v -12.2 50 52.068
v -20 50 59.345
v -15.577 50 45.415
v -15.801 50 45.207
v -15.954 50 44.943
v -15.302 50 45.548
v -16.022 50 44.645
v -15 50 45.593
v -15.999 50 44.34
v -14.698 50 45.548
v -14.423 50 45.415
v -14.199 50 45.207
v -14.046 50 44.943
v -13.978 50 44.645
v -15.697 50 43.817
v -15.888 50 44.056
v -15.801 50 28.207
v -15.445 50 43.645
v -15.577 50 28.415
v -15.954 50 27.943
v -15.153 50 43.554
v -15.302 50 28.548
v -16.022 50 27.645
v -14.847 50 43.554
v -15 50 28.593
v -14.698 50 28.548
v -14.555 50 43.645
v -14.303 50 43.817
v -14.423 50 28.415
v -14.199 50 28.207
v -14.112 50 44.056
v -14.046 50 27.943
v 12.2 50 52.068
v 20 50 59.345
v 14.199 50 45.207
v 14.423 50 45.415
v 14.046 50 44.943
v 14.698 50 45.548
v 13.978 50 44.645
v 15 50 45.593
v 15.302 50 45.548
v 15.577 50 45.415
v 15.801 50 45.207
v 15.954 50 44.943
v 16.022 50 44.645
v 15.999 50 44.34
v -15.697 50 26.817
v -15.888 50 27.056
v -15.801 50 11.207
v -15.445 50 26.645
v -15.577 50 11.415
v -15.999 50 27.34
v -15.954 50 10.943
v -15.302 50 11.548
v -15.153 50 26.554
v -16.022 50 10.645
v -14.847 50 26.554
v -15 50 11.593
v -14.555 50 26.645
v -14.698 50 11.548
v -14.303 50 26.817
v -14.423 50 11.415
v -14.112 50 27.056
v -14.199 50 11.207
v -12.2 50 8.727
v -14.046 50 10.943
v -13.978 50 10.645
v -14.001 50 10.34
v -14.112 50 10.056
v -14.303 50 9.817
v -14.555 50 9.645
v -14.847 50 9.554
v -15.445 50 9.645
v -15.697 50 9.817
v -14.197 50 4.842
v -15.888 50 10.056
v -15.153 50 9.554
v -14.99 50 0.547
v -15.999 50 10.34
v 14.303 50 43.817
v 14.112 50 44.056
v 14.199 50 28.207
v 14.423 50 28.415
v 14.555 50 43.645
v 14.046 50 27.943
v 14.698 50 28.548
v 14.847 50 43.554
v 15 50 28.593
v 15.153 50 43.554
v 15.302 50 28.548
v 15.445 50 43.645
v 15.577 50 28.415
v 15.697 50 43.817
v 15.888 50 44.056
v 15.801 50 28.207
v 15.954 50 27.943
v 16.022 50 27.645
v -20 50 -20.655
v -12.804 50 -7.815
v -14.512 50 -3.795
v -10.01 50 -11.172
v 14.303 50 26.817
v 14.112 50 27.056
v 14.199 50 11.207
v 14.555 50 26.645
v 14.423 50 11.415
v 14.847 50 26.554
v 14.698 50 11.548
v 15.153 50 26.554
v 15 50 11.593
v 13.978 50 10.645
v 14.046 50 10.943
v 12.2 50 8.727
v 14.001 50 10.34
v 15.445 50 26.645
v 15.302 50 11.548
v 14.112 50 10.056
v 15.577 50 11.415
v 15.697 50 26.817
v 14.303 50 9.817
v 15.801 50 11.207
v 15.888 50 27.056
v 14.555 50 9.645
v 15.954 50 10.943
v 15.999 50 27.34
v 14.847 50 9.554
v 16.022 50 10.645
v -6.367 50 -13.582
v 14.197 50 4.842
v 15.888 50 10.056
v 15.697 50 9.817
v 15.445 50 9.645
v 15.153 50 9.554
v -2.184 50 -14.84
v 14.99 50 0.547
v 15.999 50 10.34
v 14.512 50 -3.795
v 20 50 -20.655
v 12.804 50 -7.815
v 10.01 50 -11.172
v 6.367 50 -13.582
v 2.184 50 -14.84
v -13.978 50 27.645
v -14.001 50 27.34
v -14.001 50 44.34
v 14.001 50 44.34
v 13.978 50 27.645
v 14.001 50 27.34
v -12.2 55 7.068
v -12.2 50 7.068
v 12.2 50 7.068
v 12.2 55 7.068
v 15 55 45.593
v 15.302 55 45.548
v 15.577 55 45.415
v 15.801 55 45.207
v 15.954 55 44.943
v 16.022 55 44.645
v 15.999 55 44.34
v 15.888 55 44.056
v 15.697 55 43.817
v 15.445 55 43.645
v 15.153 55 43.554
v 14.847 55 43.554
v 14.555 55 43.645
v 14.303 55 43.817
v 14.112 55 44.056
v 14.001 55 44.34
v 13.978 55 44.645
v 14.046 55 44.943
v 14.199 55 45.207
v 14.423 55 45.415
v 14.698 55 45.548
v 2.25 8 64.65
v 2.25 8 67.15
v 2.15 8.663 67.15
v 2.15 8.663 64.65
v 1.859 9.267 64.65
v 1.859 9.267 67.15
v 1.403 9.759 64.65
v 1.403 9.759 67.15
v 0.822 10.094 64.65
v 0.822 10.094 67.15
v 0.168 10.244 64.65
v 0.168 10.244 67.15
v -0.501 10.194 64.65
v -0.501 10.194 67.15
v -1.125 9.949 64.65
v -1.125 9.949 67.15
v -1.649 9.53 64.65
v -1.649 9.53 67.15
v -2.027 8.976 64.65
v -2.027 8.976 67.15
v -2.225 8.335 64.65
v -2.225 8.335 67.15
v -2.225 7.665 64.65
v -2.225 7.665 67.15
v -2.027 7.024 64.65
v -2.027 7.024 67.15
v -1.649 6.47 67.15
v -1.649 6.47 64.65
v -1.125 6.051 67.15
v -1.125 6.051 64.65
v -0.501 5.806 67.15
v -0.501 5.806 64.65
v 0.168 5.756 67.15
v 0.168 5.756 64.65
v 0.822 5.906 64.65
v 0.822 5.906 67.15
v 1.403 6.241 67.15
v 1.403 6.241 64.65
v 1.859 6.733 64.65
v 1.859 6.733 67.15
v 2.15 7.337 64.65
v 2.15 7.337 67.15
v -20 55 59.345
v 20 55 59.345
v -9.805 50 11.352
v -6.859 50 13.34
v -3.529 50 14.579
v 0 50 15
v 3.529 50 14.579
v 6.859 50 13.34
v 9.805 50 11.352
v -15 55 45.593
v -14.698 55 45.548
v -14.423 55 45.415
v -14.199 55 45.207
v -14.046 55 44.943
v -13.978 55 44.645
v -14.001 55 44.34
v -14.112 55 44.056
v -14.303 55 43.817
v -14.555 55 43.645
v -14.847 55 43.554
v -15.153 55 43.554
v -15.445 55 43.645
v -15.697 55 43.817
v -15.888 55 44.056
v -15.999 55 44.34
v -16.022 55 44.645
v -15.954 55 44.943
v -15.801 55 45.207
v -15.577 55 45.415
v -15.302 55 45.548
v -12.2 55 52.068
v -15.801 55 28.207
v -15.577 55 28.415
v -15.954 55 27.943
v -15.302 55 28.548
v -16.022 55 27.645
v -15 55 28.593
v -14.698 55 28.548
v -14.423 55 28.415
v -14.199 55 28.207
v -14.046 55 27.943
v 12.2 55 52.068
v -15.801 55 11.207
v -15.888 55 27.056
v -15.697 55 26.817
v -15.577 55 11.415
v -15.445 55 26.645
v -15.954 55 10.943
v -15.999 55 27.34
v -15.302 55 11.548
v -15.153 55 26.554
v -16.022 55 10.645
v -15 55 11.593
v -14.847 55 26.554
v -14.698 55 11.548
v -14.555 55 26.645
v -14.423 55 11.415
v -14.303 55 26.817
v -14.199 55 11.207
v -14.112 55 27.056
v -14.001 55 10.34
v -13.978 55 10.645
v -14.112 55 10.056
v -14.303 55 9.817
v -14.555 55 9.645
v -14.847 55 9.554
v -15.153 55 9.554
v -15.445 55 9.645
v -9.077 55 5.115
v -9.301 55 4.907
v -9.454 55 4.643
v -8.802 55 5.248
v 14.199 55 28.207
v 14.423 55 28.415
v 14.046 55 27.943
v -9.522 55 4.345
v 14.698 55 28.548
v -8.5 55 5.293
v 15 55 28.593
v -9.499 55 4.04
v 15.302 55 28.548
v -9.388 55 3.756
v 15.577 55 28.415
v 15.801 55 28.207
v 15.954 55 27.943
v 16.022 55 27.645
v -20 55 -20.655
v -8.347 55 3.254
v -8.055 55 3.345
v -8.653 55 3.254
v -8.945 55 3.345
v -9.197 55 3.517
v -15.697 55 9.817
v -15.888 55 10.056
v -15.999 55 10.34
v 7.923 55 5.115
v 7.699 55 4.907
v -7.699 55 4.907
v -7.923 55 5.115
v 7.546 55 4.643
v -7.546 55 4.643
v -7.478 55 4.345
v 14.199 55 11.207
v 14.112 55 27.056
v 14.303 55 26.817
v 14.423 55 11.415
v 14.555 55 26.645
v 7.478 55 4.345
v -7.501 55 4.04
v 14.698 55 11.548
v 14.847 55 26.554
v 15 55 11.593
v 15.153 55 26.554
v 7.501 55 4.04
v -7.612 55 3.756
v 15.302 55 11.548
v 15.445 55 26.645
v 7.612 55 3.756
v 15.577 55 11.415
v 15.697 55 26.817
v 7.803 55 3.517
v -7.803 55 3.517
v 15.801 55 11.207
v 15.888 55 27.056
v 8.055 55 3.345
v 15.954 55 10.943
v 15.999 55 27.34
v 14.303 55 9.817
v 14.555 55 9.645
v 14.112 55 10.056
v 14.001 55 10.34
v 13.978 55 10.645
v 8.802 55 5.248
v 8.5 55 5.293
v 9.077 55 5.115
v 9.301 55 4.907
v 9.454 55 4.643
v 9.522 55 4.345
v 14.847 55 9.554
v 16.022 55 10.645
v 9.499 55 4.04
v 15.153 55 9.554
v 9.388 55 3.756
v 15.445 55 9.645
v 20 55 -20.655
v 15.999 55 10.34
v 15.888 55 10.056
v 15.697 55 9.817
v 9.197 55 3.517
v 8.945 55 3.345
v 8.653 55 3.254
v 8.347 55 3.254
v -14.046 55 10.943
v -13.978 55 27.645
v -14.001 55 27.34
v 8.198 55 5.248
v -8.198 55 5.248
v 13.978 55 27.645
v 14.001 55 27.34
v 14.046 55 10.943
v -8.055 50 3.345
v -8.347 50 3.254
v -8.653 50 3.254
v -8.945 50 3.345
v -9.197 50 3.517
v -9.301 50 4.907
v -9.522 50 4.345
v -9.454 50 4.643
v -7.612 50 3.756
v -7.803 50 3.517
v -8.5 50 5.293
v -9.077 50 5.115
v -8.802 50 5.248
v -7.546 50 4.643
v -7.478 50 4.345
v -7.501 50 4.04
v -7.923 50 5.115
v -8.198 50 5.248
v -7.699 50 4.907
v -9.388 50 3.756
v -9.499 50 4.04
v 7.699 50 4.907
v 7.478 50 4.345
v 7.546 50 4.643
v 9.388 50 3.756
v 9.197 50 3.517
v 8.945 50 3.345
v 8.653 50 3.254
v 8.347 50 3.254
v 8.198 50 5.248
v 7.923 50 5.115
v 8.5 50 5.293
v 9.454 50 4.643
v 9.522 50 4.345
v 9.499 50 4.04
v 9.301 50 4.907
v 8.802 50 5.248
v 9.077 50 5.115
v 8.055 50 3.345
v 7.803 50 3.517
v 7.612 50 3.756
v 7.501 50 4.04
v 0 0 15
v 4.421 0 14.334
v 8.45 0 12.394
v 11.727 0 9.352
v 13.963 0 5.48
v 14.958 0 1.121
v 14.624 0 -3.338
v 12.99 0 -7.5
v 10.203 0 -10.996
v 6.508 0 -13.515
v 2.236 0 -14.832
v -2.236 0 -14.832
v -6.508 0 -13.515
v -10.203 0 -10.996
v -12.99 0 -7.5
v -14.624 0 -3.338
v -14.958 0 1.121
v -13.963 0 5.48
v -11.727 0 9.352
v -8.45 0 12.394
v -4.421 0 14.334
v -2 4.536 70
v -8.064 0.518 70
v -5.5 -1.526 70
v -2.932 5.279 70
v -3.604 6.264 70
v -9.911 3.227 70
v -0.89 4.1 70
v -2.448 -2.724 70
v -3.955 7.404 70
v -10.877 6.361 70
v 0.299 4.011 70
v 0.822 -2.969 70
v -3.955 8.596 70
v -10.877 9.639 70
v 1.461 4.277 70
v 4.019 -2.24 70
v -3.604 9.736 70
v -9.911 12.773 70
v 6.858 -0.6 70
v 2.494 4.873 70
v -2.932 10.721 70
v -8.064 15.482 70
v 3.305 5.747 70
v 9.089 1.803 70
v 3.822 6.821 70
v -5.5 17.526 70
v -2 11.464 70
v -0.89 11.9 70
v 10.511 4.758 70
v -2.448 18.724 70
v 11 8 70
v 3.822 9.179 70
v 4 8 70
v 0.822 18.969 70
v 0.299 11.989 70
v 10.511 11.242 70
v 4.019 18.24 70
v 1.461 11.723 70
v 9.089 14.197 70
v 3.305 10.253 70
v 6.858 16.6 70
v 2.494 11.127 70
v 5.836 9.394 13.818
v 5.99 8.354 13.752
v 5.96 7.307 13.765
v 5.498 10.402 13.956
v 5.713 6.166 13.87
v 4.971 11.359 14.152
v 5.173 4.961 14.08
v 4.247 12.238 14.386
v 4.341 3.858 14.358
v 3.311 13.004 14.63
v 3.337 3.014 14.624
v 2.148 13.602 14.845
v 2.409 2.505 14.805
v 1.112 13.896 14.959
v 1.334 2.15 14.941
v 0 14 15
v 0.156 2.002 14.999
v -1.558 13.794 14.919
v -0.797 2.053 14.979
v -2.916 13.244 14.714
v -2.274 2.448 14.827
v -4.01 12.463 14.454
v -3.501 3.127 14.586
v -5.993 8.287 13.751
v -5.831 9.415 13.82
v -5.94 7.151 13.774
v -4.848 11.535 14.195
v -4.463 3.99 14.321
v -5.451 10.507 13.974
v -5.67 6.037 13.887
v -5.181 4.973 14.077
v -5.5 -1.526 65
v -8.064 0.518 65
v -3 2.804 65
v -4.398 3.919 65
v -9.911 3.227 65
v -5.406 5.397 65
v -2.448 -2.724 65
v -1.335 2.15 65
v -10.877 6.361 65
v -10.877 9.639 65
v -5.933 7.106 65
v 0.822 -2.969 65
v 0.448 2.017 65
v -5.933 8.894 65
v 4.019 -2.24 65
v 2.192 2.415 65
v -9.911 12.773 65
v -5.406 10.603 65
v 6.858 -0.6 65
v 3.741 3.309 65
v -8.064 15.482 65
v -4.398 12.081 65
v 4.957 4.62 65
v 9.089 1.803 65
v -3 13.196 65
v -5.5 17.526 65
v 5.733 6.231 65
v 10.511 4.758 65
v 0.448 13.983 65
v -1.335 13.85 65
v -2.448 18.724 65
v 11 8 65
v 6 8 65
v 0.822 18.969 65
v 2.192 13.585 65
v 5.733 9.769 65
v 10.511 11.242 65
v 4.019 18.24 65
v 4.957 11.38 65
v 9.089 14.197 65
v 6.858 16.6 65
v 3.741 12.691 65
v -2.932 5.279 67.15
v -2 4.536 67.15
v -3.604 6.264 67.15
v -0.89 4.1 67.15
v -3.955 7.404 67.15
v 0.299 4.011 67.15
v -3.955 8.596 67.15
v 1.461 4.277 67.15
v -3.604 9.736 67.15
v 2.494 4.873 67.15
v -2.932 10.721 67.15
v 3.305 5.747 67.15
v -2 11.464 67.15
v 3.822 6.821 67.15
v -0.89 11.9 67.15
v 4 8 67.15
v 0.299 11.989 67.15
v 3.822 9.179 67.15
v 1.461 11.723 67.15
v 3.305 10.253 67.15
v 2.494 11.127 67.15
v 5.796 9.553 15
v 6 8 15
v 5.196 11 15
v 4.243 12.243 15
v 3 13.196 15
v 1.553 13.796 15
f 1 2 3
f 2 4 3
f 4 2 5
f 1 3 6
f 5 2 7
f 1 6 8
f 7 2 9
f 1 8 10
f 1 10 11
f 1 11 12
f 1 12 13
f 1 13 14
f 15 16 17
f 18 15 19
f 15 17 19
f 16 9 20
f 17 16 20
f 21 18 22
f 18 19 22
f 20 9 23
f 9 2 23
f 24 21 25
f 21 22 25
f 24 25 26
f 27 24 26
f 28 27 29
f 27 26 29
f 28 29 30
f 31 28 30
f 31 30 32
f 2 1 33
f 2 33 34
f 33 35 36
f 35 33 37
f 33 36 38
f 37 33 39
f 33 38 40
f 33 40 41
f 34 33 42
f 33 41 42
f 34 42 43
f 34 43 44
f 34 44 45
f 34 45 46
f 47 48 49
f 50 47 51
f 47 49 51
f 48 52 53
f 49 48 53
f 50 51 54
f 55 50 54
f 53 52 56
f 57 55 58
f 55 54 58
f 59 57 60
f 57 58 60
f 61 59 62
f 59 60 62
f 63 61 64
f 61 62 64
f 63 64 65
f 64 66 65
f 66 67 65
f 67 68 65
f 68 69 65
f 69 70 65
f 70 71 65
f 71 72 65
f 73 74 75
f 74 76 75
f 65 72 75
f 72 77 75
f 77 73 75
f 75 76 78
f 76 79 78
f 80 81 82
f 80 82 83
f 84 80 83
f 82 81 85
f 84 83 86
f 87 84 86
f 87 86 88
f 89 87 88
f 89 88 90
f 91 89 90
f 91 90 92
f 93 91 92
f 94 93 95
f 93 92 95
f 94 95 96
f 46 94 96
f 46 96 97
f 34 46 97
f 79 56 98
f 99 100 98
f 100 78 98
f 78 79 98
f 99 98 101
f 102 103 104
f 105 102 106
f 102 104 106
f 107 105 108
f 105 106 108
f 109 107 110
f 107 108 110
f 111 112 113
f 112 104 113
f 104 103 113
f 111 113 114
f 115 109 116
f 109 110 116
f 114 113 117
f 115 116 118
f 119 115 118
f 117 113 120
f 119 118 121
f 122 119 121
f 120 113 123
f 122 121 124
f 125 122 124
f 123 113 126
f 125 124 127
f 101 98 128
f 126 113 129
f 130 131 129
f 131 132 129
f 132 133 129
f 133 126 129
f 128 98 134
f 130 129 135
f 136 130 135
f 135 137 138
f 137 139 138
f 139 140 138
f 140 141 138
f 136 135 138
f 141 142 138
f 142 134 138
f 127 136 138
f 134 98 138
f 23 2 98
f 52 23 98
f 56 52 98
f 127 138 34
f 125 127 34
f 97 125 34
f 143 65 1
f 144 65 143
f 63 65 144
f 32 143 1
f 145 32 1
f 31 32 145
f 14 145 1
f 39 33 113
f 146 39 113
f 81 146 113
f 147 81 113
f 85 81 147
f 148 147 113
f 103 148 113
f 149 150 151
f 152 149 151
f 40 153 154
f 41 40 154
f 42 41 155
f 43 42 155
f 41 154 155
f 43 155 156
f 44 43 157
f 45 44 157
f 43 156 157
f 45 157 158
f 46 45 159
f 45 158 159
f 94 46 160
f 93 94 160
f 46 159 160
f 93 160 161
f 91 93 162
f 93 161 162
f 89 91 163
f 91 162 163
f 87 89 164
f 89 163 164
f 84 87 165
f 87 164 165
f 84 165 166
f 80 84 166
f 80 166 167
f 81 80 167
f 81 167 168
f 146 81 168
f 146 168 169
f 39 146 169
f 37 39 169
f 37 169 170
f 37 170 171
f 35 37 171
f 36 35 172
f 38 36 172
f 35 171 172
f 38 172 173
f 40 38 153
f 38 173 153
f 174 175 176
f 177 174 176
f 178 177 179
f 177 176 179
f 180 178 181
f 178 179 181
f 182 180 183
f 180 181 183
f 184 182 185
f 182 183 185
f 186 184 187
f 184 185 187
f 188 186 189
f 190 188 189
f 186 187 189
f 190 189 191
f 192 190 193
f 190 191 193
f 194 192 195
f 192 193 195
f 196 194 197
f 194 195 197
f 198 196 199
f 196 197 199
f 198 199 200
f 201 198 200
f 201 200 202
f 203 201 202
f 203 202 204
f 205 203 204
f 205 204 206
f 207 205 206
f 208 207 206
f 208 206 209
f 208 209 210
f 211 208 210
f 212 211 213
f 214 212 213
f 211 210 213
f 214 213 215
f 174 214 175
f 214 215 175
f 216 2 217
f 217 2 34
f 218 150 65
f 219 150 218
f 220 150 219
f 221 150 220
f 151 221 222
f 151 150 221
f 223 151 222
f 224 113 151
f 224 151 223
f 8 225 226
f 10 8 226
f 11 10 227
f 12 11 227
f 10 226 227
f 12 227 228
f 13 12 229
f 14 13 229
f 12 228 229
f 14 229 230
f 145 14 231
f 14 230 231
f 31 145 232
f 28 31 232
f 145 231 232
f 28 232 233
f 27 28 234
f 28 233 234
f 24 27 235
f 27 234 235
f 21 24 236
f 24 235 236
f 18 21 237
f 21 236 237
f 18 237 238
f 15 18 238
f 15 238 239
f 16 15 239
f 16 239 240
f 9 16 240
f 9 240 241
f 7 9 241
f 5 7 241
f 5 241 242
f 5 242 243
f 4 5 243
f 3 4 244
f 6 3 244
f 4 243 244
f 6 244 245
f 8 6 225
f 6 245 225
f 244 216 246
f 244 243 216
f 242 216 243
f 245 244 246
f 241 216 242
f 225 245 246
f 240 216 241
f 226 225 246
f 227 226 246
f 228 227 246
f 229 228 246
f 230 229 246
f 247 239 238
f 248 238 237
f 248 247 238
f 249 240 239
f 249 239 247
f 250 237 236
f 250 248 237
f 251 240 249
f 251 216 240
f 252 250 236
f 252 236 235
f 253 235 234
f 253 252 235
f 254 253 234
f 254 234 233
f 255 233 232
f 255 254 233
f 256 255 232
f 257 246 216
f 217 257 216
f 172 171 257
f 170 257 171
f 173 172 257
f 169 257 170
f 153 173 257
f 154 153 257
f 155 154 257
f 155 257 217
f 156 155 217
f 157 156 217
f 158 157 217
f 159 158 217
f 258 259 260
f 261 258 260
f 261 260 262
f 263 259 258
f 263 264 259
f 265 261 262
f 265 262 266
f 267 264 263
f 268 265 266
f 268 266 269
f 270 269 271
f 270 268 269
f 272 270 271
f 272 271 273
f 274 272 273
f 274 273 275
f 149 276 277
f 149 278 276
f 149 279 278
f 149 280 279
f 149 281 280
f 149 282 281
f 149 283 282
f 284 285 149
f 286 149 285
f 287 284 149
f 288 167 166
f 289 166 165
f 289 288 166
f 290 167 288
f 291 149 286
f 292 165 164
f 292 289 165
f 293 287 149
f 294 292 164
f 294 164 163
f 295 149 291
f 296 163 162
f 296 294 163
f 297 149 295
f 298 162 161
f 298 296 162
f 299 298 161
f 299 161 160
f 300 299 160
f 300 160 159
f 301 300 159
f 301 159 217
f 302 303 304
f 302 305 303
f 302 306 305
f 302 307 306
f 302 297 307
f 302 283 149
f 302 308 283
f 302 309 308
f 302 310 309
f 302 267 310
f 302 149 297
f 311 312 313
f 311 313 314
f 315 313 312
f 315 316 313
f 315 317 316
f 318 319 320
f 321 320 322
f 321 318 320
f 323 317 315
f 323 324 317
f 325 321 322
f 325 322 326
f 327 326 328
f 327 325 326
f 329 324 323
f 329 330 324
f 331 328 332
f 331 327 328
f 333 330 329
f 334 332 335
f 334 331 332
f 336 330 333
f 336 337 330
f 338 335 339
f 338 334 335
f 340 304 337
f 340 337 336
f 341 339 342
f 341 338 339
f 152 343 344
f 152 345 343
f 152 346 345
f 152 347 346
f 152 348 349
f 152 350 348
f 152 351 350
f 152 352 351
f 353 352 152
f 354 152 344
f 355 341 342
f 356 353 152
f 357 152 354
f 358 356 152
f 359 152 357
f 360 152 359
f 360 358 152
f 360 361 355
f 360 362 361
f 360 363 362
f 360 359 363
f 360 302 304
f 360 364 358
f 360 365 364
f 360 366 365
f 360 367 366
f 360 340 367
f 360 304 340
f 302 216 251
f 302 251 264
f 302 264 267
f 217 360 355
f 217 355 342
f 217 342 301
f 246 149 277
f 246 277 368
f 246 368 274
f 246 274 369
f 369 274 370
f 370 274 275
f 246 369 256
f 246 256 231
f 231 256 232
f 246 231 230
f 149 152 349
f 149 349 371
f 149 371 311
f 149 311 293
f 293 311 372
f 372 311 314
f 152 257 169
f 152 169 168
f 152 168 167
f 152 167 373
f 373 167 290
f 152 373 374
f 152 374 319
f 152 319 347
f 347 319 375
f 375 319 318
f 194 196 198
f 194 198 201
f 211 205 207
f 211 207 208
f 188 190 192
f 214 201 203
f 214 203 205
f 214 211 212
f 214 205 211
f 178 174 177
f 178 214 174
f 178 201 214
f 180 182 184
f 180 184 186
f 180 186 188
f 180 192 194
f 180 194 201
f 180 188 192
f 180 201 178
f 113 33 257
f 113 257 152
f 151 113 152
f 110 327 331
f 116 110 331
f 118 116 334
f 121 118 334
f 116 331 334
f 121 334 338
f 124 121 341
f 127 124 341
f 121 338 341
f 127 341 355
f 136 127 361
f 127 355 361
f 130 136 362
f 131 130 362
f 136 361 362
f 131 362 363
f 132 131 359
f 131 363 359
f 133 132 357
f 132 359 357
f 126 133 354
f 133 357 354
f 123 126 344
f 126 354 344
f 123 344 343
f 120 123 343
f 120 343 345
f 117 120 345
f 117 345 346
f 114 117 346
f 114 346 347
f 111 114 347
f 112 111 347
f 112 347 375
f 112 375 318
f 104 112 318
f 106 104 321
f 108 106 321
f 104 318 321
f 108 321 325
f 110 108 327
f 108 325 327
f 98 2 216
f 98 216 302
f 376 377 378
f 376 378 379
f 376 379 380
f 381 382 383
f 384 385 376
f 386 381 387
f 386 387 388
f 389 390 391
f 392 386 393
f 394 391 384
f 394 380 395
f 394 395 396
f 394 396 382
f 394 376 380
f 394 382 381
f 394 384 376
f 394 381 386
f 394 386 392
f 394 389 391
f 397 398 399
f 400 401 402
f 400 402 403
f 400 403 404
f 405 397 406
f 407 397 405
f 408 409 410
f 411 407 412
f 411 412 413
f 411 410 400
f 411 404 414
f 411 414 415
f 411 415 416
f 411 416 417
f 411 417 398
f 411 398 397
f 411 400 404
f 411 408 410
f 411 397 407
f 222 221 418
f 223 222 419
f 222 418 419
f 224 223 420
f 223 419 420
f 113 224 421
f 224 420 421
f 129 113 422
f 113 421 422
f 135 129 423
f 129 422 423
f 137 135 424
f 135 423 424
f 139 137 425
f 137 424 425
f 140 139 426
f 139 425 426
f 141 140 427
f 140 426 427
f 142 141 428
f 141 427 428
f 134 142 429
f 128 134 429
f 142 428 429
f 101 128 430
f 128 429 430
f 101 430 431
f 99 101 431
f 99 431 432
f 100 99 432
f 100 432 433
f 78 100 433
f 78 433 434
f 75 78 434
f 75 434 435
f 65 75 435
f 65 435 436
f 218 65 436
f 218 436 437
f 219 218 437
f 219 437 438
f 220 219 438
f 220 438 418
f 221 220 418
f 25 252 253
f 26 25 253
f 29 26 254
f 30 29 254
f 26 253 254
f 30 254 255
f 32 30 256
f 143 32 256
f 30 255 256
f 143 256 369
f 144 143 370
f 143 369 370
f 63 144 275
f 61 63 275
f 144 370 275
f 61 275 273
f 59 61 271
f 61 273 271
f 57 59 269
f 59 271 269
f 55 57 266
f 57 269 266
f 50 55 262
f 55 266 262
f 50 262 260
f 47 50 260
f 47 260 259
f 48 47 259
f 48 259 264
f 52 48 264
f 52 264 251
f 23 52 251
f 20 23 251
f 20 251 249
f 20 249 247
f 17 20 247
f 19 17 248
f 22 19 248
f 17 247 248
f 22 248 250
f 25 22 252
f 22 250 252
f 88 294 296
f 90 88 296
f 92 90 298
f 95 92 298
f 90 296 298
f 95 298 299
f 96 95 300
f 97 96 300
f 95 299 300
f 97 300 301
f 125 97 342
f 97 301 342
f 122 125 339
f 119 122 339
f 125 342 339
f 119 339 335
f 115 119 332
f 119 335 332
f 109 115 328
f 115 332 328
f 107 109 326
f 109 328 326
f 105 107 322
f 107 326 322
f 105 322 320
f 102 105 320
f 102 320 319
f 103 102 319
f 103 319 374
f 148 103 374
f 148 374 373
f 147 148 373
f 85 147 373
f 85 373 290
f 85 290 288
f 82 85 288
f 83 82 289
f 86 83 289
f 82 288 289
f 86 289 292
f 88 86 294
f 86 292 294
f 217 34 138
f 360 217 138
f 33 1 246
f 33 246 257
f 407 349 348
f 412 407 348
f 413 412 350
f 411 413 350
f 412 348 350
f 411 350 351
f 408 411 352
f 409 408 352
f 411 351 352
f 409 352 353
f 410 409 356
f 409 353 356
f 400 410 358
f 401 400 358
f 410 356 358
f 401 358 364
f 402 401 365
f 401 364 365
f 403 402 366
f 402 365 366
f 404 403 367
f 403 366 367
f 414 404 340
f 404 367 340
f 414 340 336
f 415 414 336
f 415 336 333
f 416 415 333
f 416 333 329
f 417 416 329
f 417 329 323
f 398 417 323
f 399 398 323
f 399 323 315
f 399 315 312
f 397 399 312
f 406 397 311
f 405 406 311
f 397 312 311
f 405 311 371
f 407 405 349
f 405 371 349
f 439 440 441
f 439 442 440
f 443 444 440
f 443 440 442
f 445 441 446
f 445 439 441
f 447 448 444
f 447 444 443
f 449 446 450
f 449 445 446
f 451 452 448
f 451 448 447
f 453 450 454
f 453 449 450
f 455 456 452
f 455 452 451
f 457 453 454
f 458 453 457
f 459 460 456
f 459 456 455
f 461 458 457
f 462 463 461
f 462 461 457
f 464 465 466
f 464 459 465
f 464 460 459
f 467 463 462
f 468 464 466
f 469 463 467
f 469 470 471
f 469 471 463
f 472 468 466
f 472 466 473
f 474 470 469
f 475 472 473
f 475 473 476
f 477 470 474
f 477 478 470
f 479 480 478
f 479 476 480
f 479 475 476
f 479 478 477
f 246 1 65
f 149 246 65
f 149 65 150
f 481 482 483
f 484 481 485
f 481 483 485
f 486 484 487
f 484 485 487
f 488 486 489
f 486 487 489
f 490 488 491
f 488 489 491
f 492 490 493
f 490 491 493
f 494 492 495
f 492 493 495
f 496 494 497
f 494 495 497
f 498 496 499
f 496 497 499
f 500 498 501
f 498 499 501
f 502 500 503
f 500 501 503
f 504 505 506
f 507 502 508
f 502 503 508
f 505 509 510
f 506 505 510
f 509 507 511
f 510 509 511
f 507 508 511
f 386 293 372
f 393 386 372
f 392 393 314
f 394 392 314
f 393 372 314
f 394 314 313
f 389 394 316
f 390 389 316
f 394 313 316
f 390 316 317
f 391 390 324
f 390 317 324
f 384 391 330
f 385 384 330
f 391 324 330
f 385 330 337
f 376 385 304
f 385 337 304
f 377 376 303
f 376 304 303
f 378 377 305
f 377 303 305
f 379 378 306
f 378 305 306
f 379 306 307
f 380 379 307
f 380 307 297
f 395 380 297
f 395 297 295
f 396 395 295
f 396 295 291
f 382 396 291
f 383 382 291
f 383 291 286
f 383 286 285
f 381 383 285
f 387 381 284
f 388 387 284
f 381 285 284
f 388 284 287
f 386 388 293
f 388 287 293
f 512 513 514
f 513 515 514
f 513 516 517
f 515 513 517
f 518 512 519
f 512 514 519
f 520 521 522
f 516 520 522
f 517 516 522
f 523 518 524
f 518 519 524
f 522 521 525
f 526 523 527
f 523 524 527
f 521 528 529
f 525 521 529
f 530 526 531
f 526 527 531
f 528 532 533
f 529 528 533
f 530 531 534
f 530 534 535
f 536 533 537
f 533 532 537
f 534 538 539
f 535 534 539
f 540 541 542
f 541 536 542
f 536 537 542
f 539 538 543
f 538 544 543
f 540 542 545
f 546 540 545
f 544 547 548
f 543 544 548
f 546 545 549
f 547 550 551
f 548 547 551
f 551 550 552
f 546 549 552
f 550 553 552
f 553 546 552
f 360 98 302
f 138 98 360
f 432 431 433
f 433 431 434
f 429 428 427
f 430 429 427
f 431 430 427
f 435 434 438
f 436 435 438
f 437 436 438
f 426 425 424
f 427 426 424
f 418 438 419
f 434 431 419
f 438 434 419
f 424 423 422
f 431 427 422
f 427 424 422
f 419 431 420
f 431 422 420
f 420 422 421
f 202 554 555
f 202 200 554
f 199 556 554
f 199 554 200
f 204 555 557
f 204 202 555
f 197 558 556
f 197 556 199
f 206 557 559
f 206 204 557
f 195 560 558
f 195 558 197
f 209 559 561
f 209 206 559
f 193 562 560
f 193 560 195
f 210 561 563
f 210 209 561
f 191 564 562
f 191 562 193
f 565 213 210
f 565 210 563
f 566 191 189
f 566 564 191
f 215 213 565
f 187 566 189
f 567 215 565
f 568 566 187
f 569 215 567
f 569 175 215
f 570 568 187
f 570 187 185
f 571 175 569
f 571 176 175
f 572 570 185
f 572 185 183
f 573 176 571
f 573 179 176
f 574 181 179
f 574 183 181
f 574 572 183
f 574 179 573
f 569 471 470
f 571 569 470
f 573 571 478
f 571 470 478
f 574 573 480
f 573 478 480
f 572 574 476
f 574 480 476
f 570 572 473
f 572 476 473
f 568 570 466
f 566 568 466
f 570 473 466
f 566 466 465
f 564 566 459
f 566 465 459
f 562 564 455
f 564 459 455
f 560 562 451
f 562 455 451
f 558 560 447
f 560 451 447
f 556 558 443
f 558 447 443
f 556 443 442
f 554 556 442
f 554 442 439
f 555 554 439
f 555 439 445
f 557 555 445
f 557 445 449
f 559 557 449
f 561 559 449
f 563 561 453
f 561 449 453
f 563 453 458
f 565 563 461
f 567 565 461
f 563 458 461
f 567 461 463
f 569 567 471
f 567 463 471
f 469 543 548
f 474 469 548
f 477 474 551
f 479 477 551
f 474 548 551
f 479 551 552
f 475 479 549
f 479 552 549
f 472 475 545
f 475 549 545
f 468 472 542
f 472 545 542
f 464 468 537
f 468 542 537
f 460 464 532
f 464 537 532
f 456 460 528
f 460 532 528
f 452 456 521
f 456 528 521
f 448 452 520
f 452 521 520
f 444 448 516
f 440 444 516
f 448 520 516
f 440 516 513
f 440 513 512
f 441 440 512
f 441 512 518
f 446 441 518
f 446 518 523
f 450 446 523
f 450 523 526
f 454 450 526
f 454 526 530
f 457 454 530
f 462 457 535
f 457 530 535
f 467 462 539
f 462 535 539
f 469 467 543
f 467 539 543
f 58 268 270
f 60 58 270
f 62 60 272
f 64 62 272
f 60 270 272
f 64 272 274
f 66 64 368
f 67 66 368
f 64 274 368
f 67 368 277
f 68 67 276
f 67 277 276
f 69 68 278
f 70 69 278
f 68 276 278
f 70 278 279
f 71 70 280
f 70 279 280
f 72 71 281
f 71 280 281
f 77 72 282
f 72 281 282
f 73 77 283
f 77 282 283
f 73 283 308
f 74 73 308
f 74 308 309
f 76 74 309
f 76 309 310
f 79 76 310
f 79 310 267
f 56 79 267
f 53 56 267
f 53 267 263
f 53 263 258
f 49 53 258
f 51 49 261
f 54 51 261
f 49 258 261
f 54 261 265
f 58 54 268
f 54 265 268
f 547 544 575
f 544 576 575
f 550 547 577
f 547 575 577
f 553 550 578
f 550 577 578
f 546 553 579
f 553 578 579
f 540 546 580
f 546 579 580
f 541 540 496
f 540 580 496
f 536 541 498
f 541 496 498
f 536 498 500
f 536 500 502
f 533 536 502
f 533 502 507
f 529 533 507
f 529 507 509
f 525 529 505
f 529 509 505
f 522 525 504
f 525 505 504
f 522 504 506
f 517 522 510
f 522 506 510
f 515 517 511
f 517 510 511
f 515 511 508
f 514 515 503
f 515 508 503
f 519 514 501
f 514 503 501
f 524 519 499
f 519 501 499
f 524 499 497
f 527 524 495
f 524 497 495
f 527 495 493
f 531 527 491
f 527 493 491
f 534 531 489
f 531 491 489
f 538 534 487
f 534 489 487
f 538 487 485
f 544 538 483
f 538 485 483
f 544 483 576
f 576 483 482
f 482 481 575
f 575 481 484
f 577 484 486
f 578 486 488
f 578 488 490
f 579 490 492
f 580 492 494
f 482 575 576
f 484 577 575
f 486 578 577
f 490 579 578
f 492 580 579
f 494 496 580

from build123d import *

# Parameters (mm, degrees)
SKETCH1_R                            = 15
BOSS_EXTRUDE1_DEPTH                  = 50
SKETCH2_R                            = 6
BOSS_EXTRUDE2_DEPTH                  = 50
BOSS_EXTRUDE2_DIRECTION_2_REACH      = 62.208
BOSS_EXTRUDE2_DIRECTION_2_END_RADIUS = 15
SKETCH6_R                            = 11
BOSS_EXTRUDE4_DEPTH                  = 5
SKETCH7_W                            = 40
SKETCH7_H                            = 80
SKETCH7_W_2                          = 24.4
SKETCH7_H_2                          = 45
BOSS_EXTRUDE5_DEPTH                  = 5
SKETCH8_R                            = 1.025
CUT_EXTRUDE3_DEPTH                   = 5
SKETCH9_R                            = 4
CUT_EXTRUDE4_DEPTH                   = 2.85
SKETCH10_R                           = 2.25
CUT_EXTRUDE5_DEPTH                   = 2.5


with BuildPart() as part:
    # Sketch1 → Boss-Extrude1 (new body)
    with BuildSketch(Plane(origin=(0, 0, 0), x_dir=(1, 0, 0), z_dir=(0, 1, 0))):
        with Locations(Location((0, 0, 0), (0, 0, 270))):
            Circle(SKETCH1_R)
    extrude(amount=BOSS_EXTRUDE1_DEPTH)

    # Sketch7 → Boss-Extrude5 (add)
    with BuildSketch(Plane(origin=(0, 50, 0), x_dir=(1, 0, 0), z_dir=(0, 1, 0))):
        with Locations((0, -19.344671948)):
            Rectangle(SKETCH7_W, SKETCH7_H)
        with Locations((0, -29.568049779)):
            Rectangle(SKETCH7_W_2, SKETCH7_H_2, mode=Mode.SUBTRACT)
    extrude(amount=BOSS_EXTRUDE5_DEPTH)

    # Sketch8 → Cut-Extrude3 (cut)
    with BuildSketch(Plane(origin=(0, 55, 0), x_dir=(1, 0, 0), z_dir=(0, 1, 0))):
        with Locations(Location((15, -44.568049778, 0), (0, 0, 270))):
            Circle(SKETCH8_R)
        with Locations(Location((15, -27.568049778, 0), (0, 0, 270))):
            Circle(SKETCH8_R)
        with Locations(Location((15, -10.568049778, 0), (0, 0, 270))):
            Circle(SKETCH8_R)
        with Locations(Location((8.5, -4.268049778, 0), (0, 0, 270))):
            Circle(SKETCH8_R)
        with Locations(Location((-8.5, -4.268049778, 0), (0, 0, 270))):
            Circle(SKETCH8_R)
        with Locations(Location((-15, -10.568049778, 0), (0, 0, 270))):
            Circle(SKETCH8_R)
        with Locations(Location((-15, -27.568049778, 0), (0, 0, 270))):
            Circle(SKETCH8_R)
        with Locations(Location((-15, -44.568049778, 0), (0, 0, 270))):
            Circle(SKETCH8_R)
    extrude(amount=-CUT_EXTRUDE3_DEPTH, mode=Mode.SUBTRACT)


with BuildPart() as body_2:
    # Sketch2 → Boss-Extrude2 (new body)
    with BuildSketch(Plane.XY.offset(15)):
        with Locations((0, 8)):
            Circle(SKETCH2_R)
    extrude(amount=BOSS_EXTRUDE2_DEPTH)

    # Boss-Extrude2 direction 2: up to this cylinder (the profile starts outside it)
    boss_extrude2_direction_2_end = Plane(origin=(0, 8, 0), z_dir=(0, -1, 0)) * Cylinder(BOSS_EXTRUDE2_DIRECTION_2_END_RADIUS, 155.416, mode=Mode.PRIVATE)
    # Sketch2 → Boss-Extrude2 direction 2 (add, up to the surface)
    with BuildSketch(Plane.XY.offset(15), mode=Mode.PRIVATE) as boss_extrude2_direction_2_sk1:
        with Locations((0, 8)):
            Circle(SKETCH2_R)
    boss_extrude2_direction_2_tool1 = extrude(boss_extrude2_direction_2_sk1.sketch, amount=-BOSS_EXTRUDE2_DIRECTION_2_REACH, mode=Mode.PRIVATE) - boss_extrude2_direction_2_end
    add(boss_extrude2_direction_2_tool1.solids().sort_by_distance((0, 8, 15))[0])
    add(boss_extrude2_direction_2_tool1.solids().sort_by_distance((0, 8, 15))[1])

    # Sketch6 → Boss-Extrude4 (add)
    with BuildSketch(Plane.XY.offset(65)):
        with Locations((0, 8)):
            Circle(SKETCH6_R)
    extrude(amount=BOSS_EXTRUDE4_DEPTH)

    # Sketch9 → Cut-Extrude4 (cut)
    with BuildSketch(Plane.XY.offset(70)):
        with Locations((0, 8)):
            Circle(SKETCH9_R)
    extrude(amount=-CUT_EXTRUDE4_DEPTH, mode=Mode.SUBTRACT)

    # Sketch10 → Cut-Extrude5 (cut)
    with BuildSketch(Plane.XY.offset(67.15)):
        with Locations((0, 8)):
            Circle(SKETCH10_R)
    extrude(amount=-CUT_EXTRUDE5_DEPTH, mode=Mode.SUBTRACT)


solid = Compound([part.part, body_2.part])
